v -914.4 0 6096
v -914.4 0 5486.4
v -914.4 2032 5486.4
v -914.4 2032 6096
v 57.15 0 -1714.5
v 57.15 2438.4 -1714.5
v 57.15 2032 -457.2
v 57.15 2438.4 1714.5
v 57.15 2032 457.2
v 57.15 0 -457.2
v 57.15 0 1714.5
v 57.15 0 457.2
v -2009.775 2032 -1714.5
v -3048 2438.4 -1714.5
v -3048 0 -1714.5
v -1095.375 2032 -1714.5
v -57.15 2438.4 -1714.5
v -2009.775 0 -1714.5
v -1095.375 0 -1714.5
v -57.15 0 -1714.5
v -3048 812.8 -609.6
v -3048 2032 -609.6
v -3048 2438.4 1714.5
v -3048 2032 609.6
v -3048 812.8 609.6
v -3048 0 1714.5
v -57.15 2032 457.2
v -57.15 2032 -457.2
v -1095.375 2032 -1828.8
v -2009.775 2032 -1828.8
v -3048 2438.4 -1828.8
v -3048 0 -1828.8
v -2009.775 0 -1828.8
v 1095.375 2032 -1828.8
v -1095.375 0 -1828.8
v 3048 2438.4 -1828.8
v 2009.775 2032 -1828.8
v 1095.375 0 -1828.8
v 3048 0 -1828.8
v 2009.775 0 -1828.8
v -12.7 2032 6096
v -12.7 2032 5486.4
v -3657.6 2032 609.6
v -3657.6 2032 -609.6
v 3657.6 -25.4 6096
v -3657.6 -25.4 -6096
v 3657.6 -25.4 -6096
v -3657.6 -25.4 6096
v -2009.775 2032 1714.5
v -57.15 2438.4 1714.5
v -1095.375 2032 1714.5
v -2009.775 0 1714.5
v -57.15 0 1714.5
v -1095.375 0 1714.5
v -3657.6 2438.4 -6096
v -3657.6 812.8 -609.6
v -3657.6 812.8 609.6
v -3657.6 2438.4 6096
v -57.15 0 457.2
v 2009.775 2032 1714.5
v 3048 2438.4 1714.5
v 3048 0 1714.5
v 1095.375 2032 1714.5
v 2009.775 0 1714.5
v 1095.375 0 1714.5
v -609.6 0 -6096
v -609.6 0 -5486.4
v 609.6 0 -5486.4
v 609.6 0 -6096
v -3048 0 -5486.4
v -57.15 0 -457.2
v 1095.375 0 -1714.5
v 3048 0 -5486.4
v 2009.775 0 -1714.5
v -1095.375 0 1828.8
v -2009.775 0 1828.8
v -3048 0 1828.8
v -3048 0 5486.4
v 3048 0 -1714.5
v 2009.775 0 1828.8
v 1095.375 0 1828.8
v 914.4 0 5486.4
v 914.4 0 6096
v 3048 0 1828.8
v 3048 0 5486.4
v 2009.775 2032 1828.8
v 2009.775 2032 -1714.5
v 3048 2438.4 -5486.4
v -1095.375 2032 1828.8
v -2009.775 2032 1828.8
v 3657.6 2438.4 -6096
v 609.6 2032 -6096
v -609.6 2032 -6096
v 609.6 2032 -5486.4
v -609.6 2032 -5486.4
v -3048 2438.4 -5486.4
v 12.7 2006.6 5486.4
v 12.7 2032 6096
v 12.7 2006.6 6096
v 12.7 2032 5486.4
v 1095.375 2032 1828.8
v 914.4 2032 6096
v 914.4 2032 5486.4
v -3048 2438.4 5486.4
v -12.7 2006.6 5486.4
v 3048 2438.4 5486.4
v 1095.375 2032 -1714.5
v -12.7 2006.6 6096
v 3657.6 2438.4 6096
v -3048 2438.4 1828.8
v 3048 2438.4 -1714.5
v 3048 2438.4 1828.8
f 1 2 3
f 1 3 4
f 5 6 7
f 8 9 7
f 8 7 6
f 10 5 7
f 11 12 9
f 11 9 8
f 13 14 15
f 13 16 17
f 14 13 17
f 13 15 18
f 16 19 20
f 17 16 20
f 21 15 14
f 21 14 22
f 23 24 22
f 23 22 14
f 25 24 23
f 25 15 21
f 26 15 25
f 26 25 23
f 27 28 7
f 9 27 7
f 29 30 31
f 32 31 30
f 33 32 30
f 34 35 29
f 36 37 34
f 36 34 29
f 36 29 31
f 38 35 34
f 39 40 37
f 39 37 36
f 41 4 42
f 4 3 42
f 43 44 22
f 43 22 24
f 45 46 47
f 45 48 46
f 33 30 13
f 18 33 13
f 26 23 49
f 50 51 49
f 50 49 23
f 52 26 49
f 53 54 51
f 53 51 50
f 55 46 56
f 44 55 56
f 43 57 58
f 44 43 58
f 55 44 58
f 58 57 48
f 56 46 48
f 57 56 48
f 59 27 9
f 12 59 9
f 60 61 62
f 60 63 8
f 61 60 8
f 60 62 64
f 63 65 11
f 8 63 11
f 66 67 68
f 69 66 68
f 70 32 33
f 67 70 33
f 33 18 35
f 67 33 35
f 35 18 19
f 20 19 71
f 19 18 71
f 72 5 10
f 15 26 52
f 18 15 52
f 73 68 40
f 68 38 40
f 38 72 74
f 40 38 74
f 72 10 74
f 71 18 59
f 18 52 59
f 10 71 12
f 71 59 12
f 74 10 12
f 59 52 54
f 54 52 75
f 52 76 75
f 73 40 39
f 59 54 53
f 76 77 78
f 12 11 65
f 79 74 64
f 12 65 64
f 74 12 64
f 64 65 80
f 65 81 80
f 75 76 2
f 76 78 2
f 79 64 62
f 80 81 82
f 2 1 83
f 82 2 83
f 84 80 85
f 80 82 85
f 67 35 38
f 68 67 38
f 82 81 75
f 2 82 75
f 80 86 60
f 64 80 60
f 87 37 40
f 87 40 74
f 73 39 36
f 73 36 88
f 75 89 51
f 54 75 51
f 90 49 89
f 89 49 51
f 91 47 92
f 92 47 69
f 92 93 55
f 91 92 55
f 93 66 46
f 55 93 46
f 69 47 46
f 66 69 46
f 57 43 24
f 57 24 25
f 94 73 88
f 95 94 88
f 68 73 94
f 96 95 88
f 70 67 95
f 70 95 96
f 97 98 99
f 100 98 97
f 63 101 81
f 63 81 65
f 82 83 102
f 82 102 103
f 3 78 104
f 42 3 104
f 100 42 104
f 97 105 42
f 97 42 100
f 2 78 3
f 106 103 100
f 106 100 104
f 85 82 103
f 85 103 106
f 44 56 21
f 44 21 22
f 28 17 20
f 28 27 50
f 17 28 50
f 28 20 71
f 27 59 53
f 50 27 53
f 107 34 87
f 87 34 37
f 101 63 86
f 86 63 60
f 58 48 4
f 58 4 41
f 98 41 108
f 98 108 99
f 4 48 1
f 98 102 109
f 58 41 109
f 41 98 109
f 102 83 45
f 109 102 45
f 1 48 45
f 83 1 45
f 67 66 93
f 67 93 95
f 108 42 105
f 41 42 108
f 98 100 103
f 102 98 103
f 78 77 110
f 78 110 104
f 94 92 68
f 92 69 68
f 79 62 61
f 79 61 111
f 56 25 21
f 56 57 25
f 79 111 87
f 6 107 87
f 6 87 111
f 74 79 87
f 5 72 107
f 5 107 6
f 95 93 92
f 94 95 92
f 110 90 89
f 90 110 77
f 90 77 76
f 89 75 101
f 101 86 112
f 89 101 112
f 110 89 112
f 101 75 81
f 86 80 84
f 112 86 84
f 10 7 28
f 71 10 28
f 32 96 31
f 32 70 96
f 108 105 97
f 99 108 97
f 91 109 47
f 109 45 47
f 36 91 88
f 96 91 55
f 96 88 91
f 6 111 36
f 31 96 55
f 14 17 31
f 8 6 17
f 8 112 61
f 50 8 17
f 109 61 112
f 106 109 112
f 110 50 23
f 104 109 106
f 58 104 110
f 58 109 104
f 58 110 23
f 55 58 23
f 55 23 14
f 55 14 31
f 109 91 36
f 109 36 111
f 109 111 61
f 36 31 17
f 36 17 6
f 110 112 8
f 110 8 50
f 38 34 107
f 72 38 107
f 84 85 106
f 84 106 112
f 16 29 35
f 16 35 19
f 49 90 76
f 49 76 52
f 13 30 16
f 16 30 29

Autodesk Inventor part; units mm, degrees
ref_plane "YZ Plane" through (0, 0, 0) normal (1, 0, 0) x (0, 1, 0)
ref_plane "XZ Plane" through (0, 0, 0) normal (0, 1, 0) x (-1, 0, 0)
ref_plane "XY Plane" through (0, 0, 0) normal (0, 0, 1) x (1, 0, 0)
sketch "Sketch1" plane through (0, 0, 0) normal (0, 1, 0) x (-1, 0, 0)
  line L0 (3657.6, -6096) -> (3657.6, 6096)
  line L1 (-3657.6, 6096) -> (-3657.6, -6096)
  line L2 (-5120.64, 0) -> (5120.64, 0) projected
  line L3 (0, -16303.5007) -> (0, 17151.3473) projected
  line L4 (-3048, 1714.5) -> (-3048, -1714.5)
  line L5 (3048, -5486.4) -> (3048, -1828.8)
  line L6 (3048, -1714.5) -> (3048, 1714.5)
  line L7 (3048, 1828.8) -> (3048, 5486.4)
  line L8 (-3048, -1828.8) -> (-3048, -5486.4)
  line L9 (-3048, 5486.4) -> (-3048, 1828.8)
  line L10 (-3048, 1714.5) -> (-3048, -1714.5)
  line L11 (-2009.775, -1828.8) -> (-2009.775, -1714.5)
  line L12 (-1095.375, -1828.8) -> (-1095.375, -1714.5)
  line L13 (-3048, -1714.5) -> (-2009.775, -1714.5)
  line L14 (-1095.375, -1714.5) -> (-57.15, -1714.5)
  line L15 (-3048, -1828.8) -> (-2009.775, -1828.8)
  line L16 (2009.775, -1828.8) -> (2009.775, -1714.5)
  line L17 (1095.375, -1828.8) -> (1095.375, -1714.5)
  line L18 (3048, -1714.5) -> (2009.775, -1714.5)
  line L19 (1095.375, -1714.5) -> (57.15, -1714.5)
  line L20 (3048, -1828.8) -> (2009.775, -1828.8)
  line L21 (1095.375, -1828.8) -> (-1095.375, -1828.8)
  line L22 (-2009.775, -1828.8) -> (-3048, -1828.8)
  line L23 (-1095.375, -1828.8) -> (1095.375, -1828.8)
  line L24 (2009.775, -1828.8) -> (3048, -1828.8)
  line L25 (57.15, -1714.5) -> (1095.375, -1714.5)
  line L26 (2009.775, -1714.5) -> (3048, -1714.5)
  line L27 (-2009.775, 1828.8) -> (-2009.775, 1714.5)
  line L28 (-1095.375, 1828.8) -> (-1095.375, 1714.5)
  line L29 (-3048, 1714.5) -> (-2009.775, 1714.5)
  line L30 (-1095.375, 1714.5) -> (-57.15, 1714.5)
  line L31 (-3048, 1828.8) -> (-2009.775, 1828.8)
  line L32 (3048, 1714.5) -> (2009.775, 1714.5)
  line L33 (3048, 1828.8) -> (2009.775, 1828.8)
  line L34 (2009.775, 1828.8) -> (2009.775, 1714.5)
  line L35 (1095.375, 1828.8) -> (1095.375, 1714.5)
  line L36 (1095.375, 1714.5) -> (57.15, 1714.5)
  line L37 (1095.375, 1828.8) -> (-1095.375, 1828.8)
  line L38 (-2009.775, 1828.8) -> (-3048, 1828.8)
  line L39 (-1095.375, 1828.8) -> (1095.375, 1828.8)
  line L40 (2009.775, 1828.8) -> (3048, 1828.8)
  line L41 (57.15, 1714.5) -> (1095.375, 1714.5)
  line L42 (2009.775, 1714.5) -> (3048, 1714.5)
  line L43 (-57.15, -457.2) -> (57.15, -457.2)
  line L44 (57.15, 457.2) -> (-57.15, 457.2)
  line L45 (-609.6, -6096) -> (-609.6, -5486.4)
  line L46 (609.6, -6096) -> (609.6, -5486.4)
  line L47 (-3048, -5486.4) -> (-609.6, -5486.4)
  line L48 (609.6, -5486.4) -> (3048, -5486.4)
  line L49 (-3657.6, -6096) -> (-609.6, -6096)
  line L50 (609.6, -6096) -> (3657.6, -6096)
  line L51 (914.4, 5486.4) -> (914.4, 6096)
  line L52 (-914.4, 6096) -> (-914.4, 5486.4)
  line L53 (3048, 5486.4) -> (914.4, 5486.4)
  line L54 (-914.4, 5486.4) -> (-3048, 5486.4)
  line L55 (3657.6, 6096) -> (914.4, 6096)
  line L56 (-914.4, 6096) -> (-3657.6, 6096)
  line L57 (-57.15, -1714.5) -> (-57.15, -457.2)
  line L58 (-57.15, 457.2) -> (-57.15, 1714.5)
  line L59 (-57.15, 1714.5) -> (-57.15, 457.2)
  line L60 (-57.15, -457.2) -> (-57.15, -1714.5)
  line L61 (57.15, -1714.5) -> (57.15, -457.2)
  line L62 (57.15, 457.2) -> (57.15, 1714.5)
  line L63 (57.15, 1714.5) -> (57.15, 457.2)
  line L64 (57.15, -457.2) -> (57.15, -1714.5)
  line L65 (-3048, 5486.4) -> (-3048, 1828.8)
  line L66 (-3048, 1828.8) -> (-2009.775, 1828.8)
  line L67 (-2009.775, 1828.8) -> (-2009.775, 1714.5)
  line L68 (-2009.775, 1714.5) -> (-3048, 1714.5)
  line L69 (-3048, 1714.5) -> (-3048, -1714.5)
  line L70 (-3048, -1714.5) -> (-2009.775, -1714.5)
  line L71 (-2009.775, -1714.5) -> (-2009.775, -1828.8)
  line L72 (-2009.775, -1828.8) -> (-3048, -1828.8)
  line L73 (-3048, -1828.8) -> (-3048, -5486.4)
  line L74 (-3048, -5486.4) -> (-609.6, -5486.4)
  line L75 (609.6, -5486.4) -> (3048, -5486.4)
  line L76 (3048, -5486.4) -> (3048, -1828.8)
  line L77 (3048, -1828.8) -> (2009.775, -1828.8)
  line L78 (2009.775, -1828.8) -> (2009.775, -1714.5)
  line L79 (2009.775, -1714.5) -> (3048, -1714.5)
  line L80 (3048, 1714.5) -> (3048, -1714.5)
  line L81 (3048, 1714.5) -> (2009.775, 1714.5)
  line L82 (2009.775, 1714.5) -> (2009.775, 1828.8)
  line L83 (2009.775, 1828.8) -> (3048, 1828.8)
  line L84 (3048, 1828.8) -> (3048, 5486.4)
  point P0 (0, 0)
  point P1 (0, 16303.5007)
  point P2 (0, -17151.3473)
  dimension "d2" = 7315.2
  dimension "d10" = 609.6
  dimension "d13" = 1038.225
  dimension "d14" = 914.4
  dimension "d17" = 114.3
  dimension "d18" = 1038.225
  dimension "d19" = 1038.225
  dimension "d20" = 914.4
  dimension "d21" = 1219.2
  dimension "d23" = 609.6
  dimension "d24" = 4267.2
  dimension "d25" = 1828.8
  dimension "d26" = 12192
  dimension "d27" = 609.6
  dimension "d28" = 114.3
extrude "Extrusion1" add sketch "Sketch1" along normal blind 2438.4
sketch "Sketch2" plane through (-3657.6, 0, -6096) normal (-1, 0, 0) x (0, 0, 1)
  line L0 (0, 0) -> (12192, 0) projected
  line L1 (5486.4, 2032) -> (6705.6, 2032)
  line L2 (6705.6, 2032) -> (6705.6, 812.8)
  line L3 (6705.6, 812.8) -> (5486.4, 812.8)
  line L4 (5486.4, 812.8) -> (5486.4, 2032)
  line L5 (6096, 2926.08) -> (6096, -487.68) projected
  point P0 (6096, 0)
  dimension "d31" = 1219.2
  dimension "d33" = 1219.2
  dimension "d34" = 812.8
extrude "Extrusion2" cut sketch "Sketch2" against normal up to surface (609.6 mm away)
sketch "Sketch3" plane through (0, 2438.4, 0) normal (0, 1, 0) x (1, 0, 0)
  line L0 (57.15, 1714.5) -> (1095.375, 1714.5) projected
  line L1 (1095.375, 1714.5) -> (1095.375, 1828.8) projected
  line L2 (1095.375, 1828.8) -> (-1095.375, 1828.8) projected
  line L3 (-1095.375, 1828.8) -> (-1095.375, 1714.5) projected
  line L4 (-1095.375, 1714.5) -> (-57.15, 1714.5) projected
  line L5 (-57.15, 1714.5) -> (-57.15, 457.2) projected
  line L6 (-57.15, 457.2) -> (57.15, 457.2) projected
  line L7 (57.15, 457.2) -> (57.15, 1714.5) projected
  line L8 (-57.15, -1714.5) -> (-1095.375, -1714.5) projected
  line L9 (-1095.375, -1714.5) -> (-1095.375, -1828.8) projected
  line L10 (-1095.375, -1828.8) -> (1095.375, -1828.8) projected
  line L11 (1095.375, -1828.8) -> (1095.375, -1714.5) projected
  line L12 (1095.375, -1714.5) -> (57.15, -1714.5) projected
  line L13 (57.15, -1714.5) -> (57.15, -457.2) projected
  line L14 (57.15, -457.2) -> (-57.15, -457.2) projected
  line L15 (-57.15, -457.2) -> (-57.15, -1714.5) projected
  line L16 (3657.6, 6096) -> (609.6, 6096) projected
  line L17 (609.6, 6096) -> (609.6, 5486.4) projected
  line L18 (609.6, 5486.4) -> (3048, 5486.4) projected
  line L19 (3048, 5486.4) -> (3048, 1828.8) projected
  line L20 (3048, 1828.8) -> (2009.775, 1828.8) projected
  line L21 (2009.775, 1828.8) -> (2009.775, 1714.5) projected
  line L22 (2009.775, 1714.5) -> (3048, 1714.5) projected
  line L23 (3048, 1714.5) -> (3048, -1714.5) projected
  line L24 (3048, -1714.5) -> (2009.775, -1714.5) projected
  line L25 (2009.775, -1714.5) -> (2009.775, -1828.8) projected
  line L26 (2009.775, -1828.8) -> (3048, -1828.8) projected
  line L27 (3048, -1828.8) -> (3048, -5486.4) projected
  line L28 (3048, -5486.4) -> (914.4, -5486.4) projected
  line L29 (914.4, -5486.4) -> (914.4, -6096) projected
  line L30 (914.4, -6096) -> (3657.6, -6096) projected
  line L31 (3657.6, -6096) -> (3657.6, 6096) projected
  line L32 (-609.6, 6096) -> (609.6, 6096)
  line L33 (609.6, 6096) -> (609.6, 5486.4)
  line L34 (609.6, 5486.4) -> (-609.6, 5486.4)
  line L35 (-609.6, 5486.4) -> (-609.6, 6096)
  line L36 (-2009.775, 1828.8) -> (-1095.375, 1828.8)
  line L37 (-1095.375, 1828.8) -> (-1095.375, 1714.5)
  line L38 (-1095.375, 1714.5) -> (-2009.775, 1714.5)
  line L39 (-2009.775, 1714.5) -> (-2009.775, 1828.8)
  line L40 (1095.375, 1828.8) -> (2009.775, 1828.8)
  line L41 (2009.775, 1828.8) -> (2009.775, 1714.5)
  line L42 (2009.775, 1714.5) -> (1095.375, 1714.5)
  line L43 (1095.375, 1714.5) -> (1095.375, 1828.8)
  line L44 (-57.15, 457.2) -> (57.15, 457.2)
  line L45 (57.15, 457.2) -> (57.15, -457.2)
  line L46 (57.15, -457.2) -> (-57.15, -457.2)
  line L47 (-57.15, -457.2) -> (-57.15, 457.2)
  line L48 (1095.375, -1714.5) -> (2009.775, -1714.5)
  line L49 (2009.775, -1714.5) -> (2009.775, -1828.8)
  line L50 (2009.775, -1828.8) -> (1095.375, -1828.8)
  line L51 (1095.375, -1828.8) -> (1095.375, -1714.5)
  line L52 (-2009.775, -1714.5) -> (-1095.375, -1714.5)
  line L53 (-1095.375, -1714.5) -> (-1095.375, -1828.8)
  line L54 (-1095.375, -1828.8) -> (-2009.775, -1828.8)
  line L55 (-2009.775, -1828.8) -> (-2009.775, -1714.5)
  line L56 (-914.4, -5486.4) -> (914.4, -5486.4)
  line L57 (914.4, -5486.4) -> (914.4, -6096)
  line L58 (914.4, -6096) -> (-914.4, -6096)
  line L59 (-914.4, -6096) -> (-914.4, -5486.4)
  line L60 (1095.375, 1828.8) -> (2009.775, 1828.8)
  line L61 (2009.775, 1828.8) -> (2009.775, 1714.5)
  line L62 (2009.775, 1714.5) -> (1095.375, 1714.5)
  line L63 (1095.375, 1714.5) -> (1095.375, 1828.8)
  point P0 (0, 0)
extrude "Extrusion3" add sketch "Sketch3" against normal blind 406.4 contours L1 L40 L21 L42 | L45 L14 L47 L6 | L3 L38 L39 L36 | L48 L25 L50 L11 | L9 L54 L55 L52 | L34 L35 L32 L17 | L29 L58 L59 L56
sketch "Sketch4" plane through (0, 2032, 0) normal (0, -1, 0) x (1, 0, 0)
  line L0 (914.4, 6096) -> (-914.4, 6096) projected
  line L1 (-914.4, 5486.4) -> (914.4, 5486.4) projected
  line L2 (0, 8534.4) -> (0, -8534.4) projected
  line L3 (-12.7, 6096) -> (12.7, 6096)
  line L4 (12.7, 6096) -> (12.7, 5486.4)
  line L5 (12.7, 5486.4) -> (-12.7, 5486.4)
  line L6 (-12.7, 5486.4) -> (-12.7, 6096)
  point P0 (0, 0)
  dimension "d39" = 25.4
extrude "Extrusion4" add sketch "Sketch4" along normal blind 25.4
sketch "Sketch5" plane through (0, 0, 0) normal (0, -1, 0) x (1, 0, 0)
  line L0 (3657.6, -6096) -> (609.6, -6096) projected
  line L1 (3657.6, 6096) -> (3657.6, -6096) projected
  line L2 (914.4, 6096) -> (3657.6, 6096) projected
  line L3 (914.4, 5486.4) -> (914.4, 6096) projected
  line L4 (3048, 5486.4) -> (914.4, 5486.4) projected
  line L5 (3048, 1828.8) -> (3048, 5486.4) projected
  line L6 (2009.775, 1828.8) -> (3048, 1828.8) projected
  line L7 (2009.775, 1714.5) -> (2009.775, 1828.8) projected
  line L8 (3048, 1714.5) -> (2009.775, 1714.5) projected
  line L9 (3048, -1714.5) -> (3048, 1714.5) projected
  line L10 (2009.775, -1714.5) -> (3048, -1714.5) projected
  line L11 (2009.775, -1828.8) -> (2009.775, -1714.5) projected
  line L12 (3048, -1828.8) -> (2009.775, -1828.8) projected
  line L13 (3048, -5486.4) -> (3048, -1828.8) projected
  line L14 (609.6, -5486.4) -> (3048, -5486.4) projected
  line L15 (609.6, -6096) -> (609.6, -5486.4) projected
  line L16 (-3657.6, 6096) -> (3657.6, 6096)
  line L17 (3657.6, 6096) -> (3657.6, -6096)
  line L18 (3657.6, -6096) -> (-3657.6, -6096)
  line L19 (-3657.6, -6096) -> (-3657.6, 6096)
  point P0 (0, 0)
extrude "Extrusion5" add sketch "Sketch5" along normal blind 25.4
properties part number "East_Structure"
